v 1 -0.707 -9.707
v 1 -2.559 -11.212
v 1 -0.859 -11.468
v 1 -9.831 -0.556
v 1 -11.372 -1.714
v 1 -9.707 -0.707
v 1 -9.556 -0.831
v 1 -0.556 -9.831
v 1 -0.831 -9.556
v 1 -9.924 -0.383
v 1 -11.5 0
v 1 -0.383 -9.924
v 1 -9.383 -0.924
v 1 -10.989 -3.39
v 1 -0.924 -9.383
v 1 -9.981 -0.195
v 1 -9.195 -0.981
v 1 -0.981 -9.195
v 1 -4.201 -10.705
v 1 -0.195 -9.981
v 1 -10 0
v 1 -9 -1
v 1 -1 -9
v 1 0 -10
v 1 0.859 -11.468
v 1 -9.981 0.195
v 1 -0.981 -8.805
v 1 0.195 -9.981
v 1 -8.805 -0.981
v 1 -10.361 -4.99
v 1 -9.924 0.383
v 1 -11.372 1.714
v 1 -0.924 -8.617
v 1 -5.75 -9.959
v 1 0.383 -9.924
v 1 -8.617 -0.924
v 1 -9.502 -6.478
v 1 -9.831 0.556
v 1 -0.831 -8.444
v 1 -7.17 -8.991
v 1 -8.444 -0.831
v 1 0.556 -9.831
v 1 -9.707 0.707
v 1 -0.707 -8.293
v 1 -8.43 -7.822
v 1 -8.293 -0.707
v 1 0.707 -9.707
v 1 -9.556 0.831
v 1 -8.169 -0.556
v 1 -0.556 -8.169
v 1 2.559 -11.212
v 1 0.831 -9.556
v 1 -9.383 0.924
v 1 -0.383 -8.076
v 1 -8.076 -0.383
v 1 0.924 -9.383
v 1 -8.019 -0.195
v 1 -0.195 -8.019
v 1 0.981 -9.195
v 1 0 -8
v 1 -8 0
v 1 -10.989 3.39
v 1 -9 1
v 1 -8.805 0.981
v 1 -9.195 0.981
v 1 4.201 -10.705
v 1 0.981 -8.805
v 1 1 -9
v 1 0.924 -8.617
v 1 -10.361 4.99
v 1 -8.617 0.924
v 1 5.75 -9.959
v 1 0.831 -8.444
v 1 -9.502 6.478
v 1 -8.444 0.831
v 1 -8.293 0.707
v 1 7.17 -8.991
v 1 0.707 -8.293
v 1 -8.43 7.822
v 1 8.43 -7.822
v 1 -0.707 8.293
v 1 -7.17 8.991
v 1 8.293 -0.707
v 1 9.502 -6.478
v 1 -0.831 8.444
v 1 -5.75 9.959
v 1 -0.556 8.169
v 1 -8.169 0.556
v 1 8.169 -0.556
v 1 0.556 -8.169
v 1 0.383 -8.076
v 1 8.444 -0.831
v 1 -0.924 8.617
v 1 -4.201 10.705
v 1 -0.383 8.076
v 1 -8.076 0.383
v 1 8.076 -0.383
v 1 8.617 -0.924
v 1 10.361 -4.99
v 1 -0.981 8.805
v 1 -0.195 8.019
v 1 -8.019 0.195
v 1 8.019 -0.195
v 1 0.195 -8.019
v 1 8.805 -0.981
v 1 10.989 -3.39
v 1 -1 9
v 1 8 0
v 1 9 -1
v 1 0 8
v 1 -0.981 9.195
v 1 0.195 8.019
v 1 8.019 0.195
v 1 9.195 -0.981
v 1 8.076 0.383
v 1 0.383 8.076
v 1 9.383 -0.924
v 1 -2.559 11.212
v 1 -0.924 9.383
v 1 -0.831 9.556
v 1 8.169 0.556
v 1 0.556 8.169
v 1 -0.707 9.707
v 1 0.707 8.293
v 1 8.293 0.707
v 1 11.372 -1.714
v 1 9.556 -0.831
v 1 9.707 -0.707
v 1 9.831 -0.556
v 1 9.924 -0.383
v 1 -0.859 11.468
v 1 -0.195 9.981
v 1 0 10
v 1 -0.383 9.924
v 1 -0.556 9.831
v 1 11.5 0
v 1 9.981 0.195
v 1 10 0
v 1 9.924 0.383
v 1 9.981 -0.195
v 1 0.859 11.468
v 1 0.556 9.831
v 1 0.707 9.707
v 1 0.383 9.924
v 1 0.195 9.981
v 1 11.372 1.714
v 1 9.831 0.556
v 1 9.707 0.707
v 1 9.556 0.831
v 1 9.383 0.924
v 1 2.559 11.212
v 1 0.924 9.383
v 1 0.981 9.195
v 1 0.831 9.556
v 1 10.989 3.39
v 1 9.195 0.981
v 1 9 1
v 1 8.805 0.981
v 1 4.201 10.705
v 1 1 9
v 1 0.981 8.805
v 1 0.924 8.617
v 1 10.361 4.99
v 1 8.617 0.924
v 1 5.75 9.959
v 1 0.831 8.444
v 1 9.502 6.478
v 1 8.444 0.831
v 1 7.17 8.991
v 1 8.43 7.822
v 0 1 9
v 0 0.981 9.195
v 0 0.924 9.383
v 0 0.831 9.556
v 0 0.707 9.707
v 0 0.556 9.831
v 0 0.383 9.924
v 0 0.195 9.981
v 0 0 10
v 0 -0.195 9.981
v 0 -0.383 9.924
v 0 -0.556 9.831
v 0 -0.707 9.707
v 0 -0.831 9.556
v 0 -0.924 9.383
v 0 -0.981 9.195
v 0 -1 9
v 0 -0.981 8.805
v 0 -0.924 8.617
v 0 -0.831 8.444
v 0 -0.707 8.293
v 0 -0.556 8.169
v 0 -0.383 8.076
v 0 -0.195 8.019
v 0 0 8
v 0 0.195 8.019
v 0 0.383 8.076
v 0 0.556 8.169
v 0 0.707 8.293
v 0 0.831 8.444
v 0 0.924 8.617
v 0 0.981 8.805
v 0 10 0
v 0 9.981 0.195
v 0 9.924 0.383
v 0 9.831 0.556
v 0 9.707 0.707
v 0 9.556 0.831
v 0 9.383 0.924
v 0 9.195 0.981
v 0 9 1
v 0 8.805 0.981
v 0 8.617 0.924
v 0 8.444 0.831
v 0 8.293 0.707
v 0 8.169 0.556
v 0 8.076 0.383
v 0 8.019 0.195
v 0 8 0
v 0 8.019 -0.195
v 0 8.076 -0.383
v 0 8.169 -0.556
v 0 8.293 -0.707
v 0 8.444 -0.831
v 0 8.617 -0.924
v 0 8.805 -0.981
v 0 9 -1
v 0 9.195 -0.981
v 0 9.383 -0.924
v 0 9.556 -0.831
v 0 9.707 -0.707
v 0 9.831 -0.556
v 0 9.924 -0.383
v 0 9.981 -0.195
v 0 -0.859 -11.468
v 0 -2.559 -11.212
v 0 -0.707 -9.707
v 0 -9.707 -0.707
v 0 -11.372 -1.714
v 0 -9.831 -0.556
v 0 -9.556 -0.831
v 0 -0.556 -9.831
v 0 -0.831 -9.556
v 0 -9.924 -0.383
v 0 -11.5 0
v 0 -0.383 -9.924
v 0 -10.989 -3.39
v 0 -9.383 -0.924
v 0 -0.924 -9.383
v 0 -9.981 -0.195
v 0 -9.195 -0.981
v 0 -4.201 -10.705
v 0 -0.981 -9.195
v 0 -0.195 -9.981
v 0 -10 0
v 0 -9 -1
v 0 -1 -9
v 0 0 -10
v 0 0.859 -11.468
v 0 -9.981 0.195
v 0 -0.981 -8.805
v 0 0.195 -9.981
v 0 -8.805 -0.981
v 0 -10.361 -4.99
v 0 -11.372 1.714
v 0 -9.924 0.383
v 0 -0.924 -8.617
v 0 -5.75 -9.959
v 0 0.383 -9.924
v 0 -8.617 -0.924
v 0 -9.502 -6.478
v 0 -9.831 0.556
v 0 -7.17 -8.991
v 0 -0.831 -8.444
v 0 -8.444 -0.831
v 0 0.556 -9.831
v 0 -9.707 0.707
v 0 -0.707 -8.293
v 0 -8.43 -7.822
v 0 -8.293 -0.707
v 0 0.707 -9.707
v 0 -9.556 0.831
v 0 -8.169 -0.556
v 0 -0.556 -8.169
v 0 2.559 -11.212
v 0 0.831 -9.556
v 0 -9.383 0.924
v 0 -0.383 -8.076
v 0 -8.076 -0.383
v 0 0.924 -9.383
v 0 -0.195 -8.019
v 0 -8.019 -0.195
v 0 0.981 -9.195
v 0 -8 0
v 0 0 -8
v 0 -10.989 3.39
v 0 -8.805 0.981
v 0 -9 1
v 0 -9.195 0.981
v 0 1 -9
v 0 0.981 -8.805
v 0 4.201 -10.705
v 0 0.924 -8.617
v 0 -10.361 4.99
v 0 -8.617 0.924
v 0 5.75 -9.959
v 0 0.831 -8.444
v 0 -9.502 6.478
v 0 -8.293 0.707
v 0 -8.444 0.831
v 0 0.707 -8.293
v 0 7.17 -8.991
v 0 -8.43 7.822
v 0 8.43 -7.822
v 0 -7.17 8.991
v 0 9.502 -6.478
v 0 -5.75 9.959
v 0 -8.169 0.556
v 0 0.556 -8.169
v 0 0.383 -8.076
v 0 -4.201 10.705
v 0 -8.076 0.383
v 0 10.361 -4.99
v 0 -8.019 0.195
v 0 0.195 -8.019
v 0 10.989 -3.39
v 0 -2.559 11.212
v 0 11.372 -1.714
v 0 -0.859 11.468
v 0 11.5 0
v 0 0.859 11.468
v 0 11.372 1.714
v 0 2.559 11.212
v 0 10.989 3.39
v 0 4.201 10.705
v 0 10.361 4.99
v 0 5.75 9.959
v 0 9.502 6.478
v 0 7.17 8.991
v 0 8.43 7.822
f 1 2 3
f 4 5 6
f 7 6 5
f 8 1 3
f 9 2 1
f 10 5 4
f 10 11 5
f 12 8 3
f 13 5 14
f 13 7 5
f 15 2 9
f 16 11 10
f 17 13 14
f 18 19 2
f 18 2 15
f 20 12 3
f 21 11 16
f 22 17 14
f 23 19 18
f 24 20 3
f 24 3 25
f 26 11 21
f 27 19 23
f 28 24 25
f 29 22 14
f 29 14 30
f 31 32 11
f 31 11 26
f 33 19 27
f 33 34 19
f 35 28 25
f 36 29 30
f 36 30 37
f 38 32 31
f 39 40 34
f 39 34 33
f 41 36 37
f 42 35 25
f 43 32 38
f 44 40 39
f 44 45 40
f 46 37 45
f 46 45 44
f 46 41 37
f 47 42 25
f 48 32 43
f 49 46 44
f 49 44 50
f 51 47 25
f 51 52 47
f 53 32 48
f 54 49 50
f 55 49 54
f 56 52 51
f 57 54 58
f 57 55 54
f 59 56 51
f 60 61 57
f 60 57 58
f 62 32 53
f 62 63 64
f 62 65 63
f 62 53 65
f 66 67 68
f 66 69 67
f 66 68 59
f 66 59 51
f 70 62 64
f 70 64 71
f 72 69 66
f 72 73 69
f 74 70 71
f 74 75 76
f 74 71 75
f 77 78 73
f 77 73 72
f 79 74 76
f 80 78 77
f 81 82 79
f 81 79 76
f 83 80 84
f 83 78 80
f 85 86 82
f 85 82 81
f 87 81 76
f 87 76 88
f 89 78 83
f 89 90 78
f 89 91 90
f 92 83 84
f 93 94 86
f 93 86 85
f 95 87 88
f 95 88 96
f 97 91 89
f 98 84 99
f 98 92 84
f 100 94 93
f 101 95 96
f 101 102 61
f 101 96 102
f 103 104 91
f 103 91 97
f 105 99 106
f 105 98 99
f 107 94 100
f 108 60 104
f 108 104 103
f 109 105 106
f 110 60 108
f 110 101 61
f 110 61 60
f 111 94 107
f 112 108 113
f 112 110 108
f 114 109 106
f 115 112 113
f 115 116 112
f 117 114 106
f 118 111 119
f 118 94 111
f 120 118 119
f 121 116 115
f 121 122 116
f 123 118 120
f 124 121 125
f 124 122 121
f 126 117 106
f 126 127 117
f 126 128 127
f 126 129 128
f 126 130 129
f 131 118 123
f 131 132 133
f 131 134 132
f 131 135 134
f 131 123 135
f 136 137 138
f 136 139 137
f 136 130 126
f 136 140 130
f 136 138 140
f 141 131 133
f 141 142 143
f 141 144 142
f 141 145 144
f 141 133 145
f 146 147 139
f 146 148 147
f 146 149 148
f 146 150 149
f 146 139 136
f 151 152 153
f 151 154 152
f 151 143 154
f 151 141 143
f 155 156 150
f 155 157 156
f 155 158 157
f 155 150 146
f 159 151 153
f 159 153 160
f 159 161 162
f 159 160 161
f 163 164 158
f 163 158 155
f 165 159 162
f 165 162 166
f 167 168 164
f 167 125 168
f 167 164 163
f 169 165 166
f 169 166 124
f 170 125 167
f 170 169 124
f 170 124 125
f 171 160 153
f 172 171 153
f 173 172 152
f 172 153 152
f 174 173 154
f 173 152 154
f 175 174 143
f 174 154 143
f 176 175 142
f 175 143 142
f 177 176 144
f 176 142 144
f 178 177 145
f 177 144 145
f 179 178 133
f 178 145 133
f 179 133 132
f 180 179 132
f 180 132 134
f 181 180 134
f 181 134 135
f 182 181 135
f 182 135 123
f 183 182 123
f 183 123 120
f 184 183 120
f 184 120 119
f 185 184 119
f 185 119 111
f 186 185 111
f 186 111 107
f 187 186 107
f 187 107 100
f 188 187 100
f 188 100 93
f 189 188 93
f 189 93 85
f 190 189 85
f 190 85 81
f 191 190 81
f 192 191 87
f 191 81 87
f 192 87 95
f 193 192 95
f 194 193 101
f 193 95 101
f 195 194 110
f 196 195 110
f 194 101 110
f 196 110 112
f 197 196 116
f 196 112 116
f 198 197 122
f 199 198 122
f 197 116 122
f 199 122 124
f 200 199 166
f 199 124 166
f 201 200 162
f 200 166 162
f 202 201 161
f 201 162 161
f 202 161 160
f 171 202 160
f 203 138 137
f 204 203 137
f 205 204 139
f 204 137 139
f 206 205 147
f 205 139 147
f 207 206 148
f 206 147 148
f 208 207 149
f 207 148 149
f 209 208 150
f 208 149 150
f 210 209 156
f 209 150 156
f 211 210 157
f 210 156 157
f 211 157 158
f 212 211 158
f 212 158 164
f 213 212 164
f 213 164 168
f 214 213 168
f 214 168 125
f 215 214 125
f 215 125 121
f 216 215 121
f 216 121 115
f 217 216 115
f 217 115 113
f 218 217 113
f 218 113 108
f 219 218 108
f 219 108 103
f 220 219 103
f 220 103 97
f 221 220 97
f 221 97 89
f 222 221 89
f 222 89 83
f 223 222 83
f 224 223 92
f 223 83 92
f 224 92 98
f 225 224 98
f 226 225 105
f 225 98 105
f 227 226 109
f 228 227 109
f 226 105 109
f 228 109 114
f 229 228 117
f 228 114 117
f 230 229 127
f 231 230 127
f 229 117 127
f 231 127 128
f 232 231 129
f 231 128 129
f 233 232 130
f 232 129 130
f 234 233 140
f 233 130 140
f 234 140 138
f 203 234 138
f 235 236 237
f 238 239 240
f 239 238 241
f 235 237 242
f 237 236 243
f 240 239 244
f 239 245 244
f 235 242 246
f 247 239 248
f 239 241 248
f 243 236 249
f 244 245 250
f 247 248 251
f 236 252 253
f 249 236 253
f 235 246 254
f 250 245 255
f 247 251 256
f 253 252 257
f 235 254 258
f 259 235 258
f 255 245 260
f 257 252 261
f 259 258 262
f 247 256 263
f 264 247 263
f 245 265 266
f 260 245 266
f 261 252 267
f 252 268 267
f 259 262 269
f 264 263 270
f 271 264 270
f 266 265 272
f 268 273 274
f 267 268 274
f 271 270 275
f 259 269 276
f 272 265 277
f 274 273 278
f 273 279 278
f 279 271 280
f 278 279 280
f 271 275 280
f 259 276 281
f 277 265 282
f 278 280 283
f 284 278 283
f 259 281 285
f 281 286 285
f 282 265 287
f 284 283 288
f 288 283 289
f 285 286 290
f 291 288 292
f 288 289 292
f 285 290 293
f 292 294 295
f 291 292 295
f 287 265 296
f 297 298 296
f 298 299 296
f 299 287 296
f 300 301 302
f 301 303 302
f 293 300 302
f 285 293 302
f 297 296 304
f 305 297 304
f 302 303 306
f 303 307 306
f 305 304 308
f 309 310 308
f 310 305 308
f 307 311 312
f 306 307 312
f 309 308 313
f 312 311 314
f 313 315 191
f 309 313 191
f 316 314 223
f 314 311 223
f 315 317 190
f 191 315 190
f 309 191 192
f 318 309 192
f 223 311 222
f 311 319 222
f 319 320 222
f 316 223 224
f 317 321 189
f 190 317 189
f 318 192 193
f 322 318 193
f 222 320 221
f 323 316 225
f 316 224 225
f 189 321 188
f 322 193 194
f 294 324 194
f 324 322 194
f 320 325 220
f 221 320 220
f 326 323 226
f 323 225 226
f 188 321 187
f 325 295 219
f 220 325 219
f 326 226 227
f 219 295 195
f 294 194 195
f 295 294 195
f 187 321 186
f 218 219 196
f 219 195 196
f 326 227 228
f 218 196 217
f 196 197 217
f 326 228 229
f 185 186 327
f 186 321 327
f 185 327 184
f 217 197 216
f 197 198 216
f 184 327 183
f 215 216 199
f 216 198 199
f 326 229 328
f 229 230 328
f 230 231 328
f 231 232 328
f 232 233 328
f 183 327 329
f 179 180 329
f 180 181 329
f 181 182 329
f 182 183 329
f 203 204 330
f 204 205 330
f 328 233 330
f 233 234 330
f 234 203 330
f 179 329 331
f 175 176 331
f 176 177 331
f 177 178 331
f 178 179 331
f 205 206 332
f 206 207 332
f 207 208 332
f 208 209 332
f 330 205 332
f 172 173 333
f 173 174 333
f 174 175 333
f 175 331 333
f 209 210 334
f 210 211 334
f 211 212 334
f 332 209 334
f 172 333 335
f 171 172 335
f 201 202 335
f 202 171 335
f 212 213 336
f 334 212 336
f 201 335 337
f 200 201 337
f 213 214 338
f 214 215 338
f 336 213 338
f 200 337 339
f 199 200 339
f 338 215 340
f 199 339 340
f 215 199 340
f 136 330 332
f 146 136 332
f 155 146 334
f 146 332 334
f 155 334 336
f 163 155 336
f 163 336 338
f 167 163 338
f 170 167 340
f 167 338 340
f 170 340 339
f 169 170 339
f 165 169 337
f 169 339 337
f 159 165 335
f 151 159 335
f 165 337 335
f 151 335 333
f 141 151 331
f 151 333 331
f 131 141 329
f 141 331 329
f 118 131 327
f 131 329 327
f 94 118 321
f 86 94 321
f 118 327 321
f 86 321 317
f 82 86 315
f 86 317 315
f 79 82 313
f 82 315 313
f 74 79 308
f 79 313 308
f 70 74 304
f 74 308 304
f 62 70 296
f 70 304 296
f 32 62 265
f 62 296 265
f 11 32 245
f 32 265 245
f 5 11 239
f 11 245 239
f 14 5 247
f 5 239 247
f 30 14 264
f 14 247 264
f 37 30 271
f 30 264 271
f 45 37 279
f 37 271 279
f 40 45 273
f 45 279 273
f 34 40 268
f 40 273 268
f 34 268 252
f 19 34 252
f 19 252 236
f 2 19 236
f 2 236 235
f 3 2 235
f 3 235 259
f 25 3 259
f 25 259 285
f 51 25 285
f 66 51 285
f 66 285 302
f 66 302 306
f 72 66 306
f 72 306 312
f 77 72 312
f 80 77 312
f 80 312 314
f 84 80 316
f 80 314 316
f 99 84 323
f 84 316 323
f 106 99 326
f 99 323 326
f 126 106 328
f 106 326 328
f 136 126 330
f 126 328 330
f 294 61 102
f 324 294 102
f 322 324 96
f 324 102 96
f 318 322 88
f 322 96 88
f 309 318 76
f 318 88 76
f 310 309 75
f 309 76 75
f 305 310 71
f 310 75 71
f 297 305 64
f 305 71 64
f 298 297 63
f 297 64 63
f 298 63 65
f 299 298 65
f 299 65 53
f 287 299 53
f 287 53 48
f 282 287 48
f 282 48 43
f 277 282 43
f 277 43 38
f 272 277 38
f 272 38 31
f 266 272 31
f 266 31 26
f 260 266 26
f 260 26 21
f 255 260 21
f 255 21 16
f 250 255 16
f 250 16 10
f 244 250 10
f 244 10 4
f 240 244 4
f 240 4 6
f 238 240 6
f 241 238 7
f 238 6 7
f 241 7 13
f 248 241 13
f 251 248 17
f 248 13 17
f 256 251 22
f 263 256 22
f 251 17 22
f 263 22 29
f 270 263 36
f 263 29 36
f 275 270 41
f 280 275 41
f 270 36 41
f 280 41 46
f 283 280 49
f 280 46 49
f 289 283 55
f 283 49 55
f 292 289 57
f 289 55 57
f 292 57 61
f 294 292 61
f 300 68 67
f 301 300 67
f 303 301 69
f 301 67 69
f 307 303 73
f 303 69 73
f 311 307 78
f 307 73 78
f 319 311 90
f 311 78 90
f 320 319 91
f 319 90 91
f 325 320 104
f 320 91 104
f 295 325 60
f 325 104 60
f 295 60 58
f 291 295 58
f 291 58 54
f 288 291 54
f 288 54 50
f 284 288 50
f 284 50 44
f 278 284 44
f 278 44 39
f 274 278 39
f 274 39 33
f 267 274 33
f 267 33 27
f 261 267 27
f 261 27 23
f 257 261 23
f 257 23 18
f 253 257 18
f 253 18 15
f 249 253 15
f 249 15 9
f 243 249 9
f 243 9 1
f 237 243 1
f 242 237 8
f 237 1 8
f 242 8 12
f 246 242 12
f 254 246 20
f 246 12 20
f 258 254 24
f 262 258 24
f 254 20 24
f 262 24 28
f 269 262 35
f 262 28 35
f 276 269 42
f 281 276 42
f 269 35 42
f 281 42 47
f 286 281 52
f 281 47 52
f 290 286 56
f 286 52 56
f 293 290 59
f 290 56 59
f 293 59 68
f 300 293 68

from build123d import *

# Parameters (mm, degrees)
F0_R     = 11.5
F1_DEPTH = 1
F2_R     = 1
F3_DEPTH = 1.001


with BuildPart() as f1:
    # F0 (on Right) → F1 (new body)
    with BuildSketch(Plane.YZ):
        Circle(F0_R)
    extrude(amount=F1_DEPTH)

    # F2 (on face) → F3 (cut, through all)
    with BuildSketch(Plane.YZ.offset(1)):
        with Locations((0, 9)):
            Circle(F2_R)
        with Locations((9, 0)):
            Circle(F2_R)
        with Locations((0, -9)):
            Circle(F2_R)
        with Locations((-9, 0)):
            Circle(F2_R)
    extrude(amount=-F3_DEPTH, mode=Mode.SUBTRACT)


solid = f1.part
